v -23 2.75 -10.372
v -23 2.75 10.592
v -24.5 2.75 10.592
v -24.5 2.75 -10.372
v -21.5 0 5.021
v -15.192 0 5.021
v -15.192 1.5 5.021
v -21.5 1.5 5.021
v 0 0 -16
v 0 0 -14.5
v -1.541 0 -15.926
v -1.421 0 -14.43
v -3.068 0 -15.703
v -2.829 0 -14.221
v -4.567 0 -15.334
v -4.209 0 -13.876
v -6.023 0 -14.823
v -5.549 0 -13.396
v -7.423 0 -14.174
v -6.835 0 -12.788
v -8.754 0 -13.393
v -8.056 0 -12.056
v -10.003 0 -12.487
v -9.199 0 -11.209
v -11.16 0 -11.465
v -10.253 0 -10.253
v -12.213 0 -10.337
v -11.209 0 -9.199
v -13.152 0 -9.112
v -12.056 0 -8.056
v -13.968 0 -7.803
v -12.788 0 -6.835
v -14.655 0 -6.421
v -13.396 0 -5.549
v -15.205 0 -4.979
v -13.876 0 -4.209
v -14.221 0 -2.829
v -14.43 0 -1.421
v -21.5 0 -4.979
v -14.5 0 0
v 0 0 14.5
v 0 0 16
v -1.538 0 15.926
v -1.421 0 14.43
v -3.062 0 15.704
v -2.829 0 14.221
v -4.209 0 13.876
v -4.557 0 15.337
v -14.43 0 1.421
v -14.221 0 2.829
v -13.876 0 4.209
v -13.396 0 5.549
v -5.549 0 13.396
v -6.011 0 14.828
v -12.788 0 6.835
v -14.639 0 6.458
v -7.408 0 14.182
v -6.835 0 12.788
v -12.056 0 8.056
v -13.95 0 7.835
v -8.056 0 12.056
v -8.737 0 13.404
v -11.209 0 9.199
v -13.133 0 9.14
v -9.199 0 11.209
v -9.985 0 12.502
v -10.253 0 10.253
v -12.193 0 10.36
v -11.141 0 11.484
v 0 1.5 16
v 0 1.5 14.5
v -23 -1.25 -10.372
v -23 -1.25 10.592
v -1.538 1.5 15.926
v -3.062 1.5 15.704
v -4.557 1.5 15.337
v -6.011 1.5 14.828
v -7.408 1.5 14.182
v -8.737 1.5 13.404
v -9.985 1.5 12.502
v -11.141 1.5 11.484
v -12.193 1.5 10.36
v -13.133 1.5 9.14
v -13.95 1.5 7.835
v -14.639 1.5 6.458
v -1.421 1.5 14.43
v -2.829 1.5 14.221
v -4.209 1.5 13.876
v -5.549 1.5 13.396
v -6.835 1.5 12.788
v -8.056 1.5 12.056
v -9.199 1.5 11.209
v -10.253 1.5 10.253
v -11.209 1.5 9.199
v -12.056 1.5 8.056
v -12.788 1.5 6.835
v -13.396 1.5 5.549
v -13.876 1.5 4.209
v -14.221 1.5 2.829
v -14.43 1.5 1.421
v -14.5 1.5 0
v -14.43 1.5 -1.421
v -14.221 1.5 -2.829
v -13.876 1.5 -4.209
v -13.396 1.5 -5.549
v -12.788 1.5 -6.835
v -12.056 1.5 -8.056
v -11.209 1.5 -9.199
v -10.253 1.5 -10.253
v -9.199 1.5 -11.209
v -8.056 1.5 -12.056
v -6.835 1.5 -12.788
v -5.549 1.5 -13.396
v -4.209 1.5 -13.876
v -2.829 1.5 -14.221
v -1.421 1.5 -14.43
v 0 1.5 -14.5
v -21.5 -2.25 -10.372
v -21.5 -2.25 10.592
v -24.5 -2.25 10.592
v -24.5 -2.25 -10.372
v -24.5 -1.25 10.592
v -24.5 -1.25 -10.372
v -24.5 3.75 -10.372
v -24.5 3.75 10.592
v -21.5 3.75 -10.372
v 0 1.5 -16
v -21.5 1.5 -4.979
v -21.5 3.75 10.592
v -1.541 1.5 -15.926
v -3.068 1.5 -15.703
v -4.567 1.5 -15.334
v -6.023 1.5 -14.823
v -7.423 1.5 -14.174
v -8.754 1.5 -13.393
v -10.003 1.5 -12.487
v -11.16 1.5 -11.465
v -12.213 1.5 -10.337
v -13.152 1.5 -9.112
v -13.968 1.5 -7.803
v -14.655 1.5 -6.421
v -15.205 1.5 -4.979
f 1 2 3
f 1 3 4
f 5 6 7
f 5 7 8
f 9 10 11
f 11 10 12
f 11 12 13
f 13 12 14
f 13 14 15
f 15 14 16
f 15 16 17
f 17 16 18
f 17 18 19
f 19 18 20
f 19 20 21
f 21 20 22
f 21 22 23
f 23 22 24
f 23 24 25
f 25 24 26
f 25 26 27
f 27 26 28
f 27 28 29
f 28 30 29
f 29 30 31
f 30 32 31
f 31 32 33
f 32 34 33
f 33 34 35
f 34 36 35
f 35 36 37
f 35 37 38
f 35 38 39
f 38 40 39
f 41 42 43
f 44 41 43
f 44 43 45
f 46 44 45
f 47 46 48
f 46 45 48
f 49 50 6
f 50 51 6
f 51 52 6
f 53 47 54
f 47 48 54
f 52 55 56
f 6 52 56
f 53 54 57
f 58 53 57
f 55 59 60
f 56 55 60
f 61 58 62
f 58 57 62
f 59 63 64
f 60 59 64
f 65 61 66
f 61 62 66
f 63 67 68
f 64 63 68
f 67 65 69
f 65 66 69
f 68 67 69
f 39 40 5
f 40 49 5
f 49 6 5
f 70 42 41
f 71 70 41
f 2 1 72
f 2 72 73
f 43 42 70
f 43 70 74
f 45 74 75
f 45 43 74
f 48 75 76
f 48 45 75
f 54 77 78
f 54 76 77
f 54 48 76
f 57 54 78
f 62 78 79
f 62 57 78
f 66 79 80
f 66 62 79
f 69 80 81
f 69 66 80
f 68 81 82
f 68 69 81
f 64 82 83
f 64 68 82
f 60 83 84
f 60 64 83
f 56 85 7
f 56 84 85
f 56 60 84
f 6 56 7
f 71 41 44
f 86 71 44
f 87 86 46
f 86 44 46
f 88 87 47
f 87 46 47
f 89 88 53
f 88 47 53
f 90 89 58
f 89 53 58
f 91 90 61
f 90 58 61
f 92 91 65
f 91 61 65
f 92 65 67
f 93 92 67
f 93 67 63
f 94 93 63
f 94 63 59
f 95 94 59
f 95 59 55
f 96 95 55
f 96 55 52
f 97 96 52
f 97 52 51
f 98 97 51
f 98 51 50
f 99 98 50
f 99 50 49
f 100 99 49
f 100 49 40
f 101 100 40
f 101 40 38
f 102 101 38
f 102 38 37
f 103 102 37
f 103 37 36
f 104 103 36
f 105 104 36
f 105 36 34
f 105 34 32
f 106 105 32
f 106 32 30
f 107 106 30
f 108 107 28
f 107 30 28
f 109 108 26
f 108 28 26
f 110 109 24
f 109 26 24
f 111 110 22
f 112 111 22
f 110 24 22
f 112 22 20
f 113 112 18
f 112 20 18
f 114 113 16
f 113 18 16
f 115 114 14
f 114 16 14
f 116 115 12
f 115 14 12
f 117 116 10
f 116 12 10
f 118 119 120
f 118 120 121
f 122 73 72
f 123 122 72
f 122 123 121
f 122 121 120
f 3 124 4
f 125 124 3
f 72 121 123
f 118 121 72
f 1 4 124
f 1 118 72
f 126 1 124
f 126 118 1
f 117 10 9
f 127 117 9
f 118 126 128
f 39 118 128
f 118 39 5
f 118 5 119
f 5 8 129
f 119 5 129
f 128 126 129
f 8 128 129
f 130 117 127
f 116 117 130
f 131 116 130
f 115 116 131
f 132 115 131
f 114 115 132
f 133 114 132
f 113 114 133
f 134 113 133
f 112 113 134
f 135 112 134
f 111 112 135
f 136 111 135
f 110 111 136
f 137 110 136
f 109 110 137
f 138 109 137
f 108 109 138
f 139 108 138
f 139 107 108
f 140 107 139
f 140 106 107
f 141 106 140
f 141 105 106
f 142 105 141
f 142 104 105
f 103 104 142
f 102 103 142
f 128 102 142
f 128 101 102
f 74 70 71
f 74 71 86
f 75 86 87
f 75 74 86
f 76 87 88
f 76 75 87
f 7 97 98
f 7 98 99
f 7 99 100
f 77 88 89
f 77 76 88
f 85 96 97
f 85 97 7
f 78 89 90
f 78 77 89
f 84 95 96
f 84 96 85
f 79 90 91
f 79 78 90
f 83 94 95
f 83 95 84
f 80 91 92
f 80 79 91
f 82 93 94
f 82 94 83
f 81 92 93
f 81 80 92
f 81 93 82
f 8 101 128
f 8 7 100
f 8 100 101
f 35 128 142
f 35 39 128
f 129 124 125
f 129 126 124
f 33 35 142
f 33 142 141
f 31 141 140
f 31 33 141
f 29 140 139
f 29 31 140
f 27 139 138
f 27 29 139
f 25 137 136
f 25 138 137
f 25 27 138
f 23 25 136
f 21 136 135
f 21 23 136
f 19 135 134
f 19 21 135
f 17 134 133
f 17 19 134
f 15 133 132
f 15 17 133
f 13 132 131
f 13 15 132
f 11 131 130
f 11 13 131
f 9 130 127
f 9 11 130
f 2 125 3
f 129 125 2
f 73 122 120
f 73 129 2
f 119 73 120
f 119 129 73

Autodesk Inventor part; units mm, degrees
ref_plane "YZ Plane" through (0, 0, 0) normal (1, 0, 0) x (0, 1, 0)
ref_plane "XZ Plane" through (0, 0, 0) normal (0, 1, 0) x (-1, 0, 0)
ref_plane "XY Plane" through (0, 0, 0) normal (0, 0, 1) x (1, 0, 0)
sketch "Sketch1" plane through (0, 0, 0) normal (0, 1, 0) x (-1, 0, 0)
  circle A0 centre (0, 0) radius 14.5
  circle A1 centre (0, 0) radius 16
  line L0 (0, 16) -> (0, -16)
  line L1 (14.5, 5.0206) -> (21.5, 5.0206)
  line L2 (21.5, 5.0206) -> (21.5, -4.9794)
  line L3 (21.5, -4.9794) -> (14.5, -4.9794)
  line L4 (14.5, -4.9794) -> (14.5, 5.0206)
  point P0 (14.5, 0.0206)
  point P1 (15.2054, -4.9794)
  point P2 (15.1919, 5.0206)
  point P3 (0, 14.5)
  point P4 (0, -14.5)
  dimension "d0" = 29
  dimension "d1" = 32
  dimension "d2" = 5
  dimension "d13" = 7
extrude "Extrusion1" add sketch "Sketch1" along normal blind 1.5 contours L4 L3 A1 L0 A0 | L4 L1 A1 L3 | A0 L0 A1 L1 L4 | A1 L1 L2 L3
sketch "Sketch2" plane through (-21.5, 0, -4.9794) normal (-1, 0, 0) x (0, 0, 1)
  line L0 (-5.3921, 3.75) -> (15.5709, 3.75)
  line L1 (15.5709, 3.75) -> (15.5709, -2.25)
  line L2 (15.5709, -2.25) -> (-5.3921, -2.25)
  line L3 (-5.3921, -2.25) -> (-5.3921, 3.75)
  line L4 (0, 0) -> (0, 1.5) projected
  point P0 (4.9794, 0)
  point P1 (5.0894, 3.75)
  point P2 (0, 0.75)
  dimension "d5" = 6
  dimension "d6" = 3
extrude "Extrusion2" add sketch "Sketch2" along normal blind 1.5
sketch "Sketch3" plane through (-23, 0, -4.9794) normal (-1, 0, 0) x (0, 0, 1)
  line L0 (15.5709, 3.75) -> (-5.3921, 3.75) projected
  line L1 (15.5709, -2.25) -> (15.5709, 3.75) projected
  line L2 (-5.3921, 3.75) -> (15.5709, 3.75)
  line L3 (15.5709, 3.75) -> (15.5709, 2.75)
  line L4 (15.5709, 2.75) -> (-5.3921, 2.75)
  line L5 (-5.3921, 2.75) -> (-5.3921, 3.75)
  line L6 (-5.3921, -2.25) -> (15.5709, -2.25)
  line L7 (15.5709, -2.25) -> (15.5709, -1.25)
  line L8 (15.5709, -1.25) -> (-5.3921, -1.25)
  line L9 (-5.3921, -1.25) -> (-5.3921, -2.25)
  point P0 (4.9794, 0)
  point P1 (15.5709, -2.25)
  dimension "d9" = 1
  dimension "d10" = 1
extrude "Extrusion3" add sketch "Sketch3" along normal blind 1.5
properties part number "holder"
